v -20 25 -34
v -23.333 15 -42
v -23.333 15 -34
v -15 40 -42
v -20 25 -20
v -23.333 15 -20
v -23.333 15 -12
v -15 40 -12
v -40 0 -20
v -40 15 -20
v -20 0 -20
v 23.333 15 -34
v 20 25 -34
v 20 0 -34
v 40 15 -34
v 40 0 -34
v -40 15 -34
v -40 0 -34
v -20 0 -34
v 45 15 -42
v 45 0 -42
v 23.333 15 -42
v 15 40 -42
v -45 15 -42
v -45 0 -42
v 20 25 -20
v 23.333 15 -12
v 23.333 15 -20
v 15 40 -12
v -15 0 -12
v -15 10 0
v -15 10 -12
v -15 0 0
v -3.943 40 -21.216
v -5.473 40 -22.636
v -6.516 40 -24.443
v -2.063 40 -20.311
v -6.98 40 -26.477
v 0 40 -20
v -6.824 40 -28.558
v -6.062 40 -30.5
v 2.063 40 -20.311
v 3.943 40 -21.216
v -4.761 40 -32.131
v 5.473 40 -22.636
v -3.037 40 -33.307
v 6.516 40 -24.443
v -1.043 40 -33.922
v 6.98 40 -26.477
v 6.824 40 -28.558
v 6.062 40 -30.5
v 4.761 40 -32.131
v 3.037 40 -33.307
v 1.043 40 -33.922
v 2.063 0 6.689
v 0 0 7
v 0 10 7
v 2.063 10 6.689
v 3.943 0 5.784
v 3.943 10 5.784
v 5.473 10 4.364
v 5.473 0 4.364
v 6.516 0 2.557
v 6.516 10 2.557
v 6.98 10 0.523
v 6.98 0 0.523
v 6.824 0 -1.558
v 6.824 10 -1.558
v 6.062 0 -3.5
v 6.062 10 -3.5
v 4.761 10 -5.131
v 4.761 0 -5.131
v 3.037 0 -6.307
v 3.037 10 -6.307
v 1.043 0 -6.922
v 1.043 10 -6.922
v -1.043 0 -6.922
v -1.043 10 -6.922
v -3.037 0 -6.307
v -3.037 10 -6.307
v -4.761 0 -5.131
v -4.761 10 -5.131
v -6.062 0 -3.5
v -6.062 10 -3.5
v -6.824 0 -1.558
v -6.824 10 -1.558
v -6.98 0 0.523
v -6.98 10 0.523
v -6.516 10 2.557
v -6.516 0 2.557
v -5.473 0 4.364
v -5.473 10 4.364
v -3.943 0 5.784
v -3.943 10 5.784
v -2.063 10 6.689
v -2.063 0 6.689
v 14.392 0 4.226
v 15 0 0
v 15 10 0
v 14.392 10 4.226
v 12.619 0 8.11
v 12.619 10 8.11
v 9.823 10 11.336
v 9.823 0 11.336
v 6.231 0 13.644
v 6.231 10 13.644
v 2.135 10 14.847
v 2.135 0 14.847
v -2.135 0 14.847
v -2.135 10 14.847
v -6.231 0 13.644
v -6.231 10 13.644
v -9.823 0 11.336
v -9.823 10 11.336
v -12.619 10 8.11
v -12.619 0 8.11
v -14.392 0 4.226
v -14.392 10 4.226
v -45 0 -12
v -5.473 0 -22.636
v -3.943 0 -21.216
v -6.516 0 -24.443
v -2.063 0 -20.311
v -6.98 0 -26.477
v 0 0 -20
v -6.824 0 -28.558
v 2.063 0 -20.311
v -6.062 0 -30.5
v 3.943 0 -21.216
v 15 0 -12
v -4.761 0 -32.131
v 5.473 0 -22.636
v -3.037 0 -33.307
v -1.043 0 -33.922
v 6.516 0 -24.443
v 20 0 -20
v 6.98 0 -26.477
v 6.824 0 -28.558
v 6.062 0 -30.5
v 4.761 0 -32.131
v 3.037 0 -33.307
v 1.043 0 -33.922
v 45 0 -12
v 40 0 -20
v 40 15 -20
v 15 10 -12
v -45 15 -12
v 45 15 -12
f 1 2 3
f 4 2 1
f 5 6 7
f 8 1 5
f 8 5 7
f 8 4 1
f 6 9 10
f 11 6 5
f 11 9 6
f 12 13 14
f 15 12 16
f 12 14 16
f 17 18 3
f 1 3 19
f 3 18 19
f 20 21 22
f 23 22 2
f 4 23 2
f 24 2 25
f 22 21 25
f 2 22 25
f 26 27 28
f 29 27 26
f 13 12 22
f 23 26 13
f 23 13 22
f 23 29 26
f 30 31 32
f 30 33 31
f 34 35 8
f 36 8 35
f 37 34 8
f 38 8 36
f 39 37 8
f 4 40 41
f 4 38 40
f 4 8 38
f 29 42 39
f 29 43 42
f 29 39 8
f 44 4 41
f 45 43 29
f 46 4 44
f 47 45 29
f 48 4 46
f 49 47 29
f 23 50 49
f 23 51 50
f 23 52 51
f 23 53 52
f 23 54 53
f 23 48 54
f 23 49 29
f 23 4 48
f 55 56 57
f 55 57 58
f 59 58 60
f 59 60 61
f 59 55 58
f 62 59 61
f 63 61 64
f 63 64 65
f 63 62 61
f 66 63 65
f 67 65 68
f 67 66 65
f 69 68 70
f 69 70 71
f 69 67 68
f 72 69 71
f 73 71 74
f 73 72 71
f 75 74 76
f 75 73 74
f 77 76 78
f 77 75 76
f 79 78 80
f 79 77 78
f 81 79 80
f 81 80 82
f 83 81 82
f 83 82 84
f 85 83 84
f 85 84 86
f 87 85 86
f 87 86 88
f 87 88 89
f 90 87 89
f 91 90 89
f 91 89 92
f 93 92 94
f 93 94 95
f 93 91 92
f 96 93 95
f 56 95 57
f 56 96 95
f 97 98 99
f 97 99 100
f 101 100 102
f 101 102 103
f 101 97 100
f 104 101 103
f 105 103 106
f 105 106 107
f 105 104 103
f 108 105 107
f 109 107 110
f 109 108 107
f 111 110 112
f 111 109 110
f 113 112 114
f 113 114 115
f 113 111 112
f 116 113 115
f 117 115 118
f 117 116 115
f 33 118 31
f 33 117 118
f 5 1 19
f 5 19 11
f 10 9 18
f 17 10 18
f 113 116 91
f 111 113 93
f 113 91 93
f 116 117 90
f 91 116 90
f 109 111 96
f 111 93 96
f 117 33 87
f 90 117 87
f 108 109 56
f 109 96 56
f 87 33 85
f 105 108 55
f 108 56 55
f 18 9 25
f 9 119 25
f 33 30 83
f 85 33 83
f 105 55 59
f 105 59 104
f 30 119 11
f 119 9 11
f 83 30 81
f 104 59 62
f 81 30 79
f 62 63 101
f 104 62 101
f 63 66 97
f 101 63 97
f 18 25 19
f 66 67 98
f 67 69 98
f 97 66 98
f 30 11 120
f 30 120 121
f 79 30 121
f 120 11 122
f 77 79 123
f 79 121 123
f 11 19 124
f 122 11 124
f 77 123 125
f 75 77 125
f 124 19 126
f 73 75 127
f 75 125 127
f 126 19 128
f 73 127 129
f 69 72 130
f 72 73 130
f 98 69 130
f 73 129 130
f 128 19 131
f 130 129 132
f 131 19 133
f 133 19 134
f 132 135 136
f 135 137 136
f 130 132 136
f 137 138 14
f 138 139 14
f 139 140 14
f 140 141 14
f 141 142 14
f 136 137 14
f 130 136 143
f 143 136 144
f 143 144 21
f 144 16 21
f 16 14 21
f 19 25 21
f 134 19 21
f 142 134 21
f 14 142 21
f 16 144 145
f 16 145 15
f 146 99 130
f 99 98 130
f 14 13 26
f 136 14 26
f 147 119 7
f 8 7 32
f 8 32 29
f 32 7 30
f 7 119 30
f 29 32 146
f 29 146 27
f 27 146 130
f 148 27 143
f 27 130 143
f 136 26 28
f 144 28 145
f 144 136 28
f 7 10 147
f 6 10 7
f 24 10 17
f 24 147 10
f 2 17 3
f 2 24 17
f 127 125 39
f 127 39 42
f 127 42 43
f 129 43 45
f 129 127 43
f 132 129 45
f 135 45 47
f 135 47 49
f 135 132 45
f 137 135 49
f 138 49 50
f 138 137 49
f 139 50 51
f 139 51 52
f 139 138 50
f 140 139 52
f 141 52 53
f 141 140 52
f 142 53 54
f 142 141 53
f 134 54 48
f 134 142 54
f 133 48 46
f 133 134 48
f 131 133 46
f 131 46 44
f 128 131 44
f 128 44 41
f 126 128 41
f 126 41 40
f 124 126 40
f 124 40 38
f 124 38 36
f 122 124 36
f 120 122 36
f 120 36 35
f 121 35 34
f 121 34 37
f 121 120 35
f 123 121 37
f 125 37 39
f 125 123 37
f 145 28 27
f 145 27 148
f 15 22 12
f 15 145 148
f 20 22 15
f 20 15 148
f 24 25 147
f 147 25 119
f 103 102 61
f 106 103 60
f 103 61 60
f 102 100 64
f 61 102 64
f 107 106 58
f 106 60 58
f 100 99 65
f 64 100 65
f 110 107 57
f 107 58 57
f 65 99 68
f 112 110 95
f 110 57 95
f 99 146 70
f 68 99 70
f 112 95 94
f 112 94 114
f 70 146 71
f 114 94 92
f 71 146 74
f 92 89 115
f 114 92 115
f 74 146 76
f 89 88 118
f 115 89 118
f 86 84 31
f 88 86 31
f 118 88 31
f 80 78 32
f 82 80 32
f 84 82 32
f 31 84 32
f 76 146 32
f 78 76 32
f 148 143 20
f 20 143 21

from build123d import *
from OCP.BRepFilletAPI import BRepFilletAPI_MakeChamfer

# Parameters (mm, degrees)
SKETCH1_R           = 7
BOSS_EXTRUDE1_DEPTH = 10
SKETCH1_5_W         = 30
SKETCH1_5_H         = 30
SKETCH1_5_R         = 7
BOSS_EXTRUDE2_DEPTH = 40
BOSS_EXTRUDE5_DEPTH = 15
BOSS_EXTRUDE6_DEPTH = 15
SKETCH1_13_W        = 10
SKETCH1_13_H        = 30
BOSS_EXTRUDE7_DEPTH = 40
CHAMFER2_SIZE       = 30
CHAMFER2_SIZE2      = 10
SKETCH4_W           = 5
SKETCH4_H           = 14
CUT_EXTRUDE3_DEPTH  = 74.409808609


with BuildPart() as part:
    # Sketch1 → Boss-Extrude1 (new body)
    with BuildSketch(Plane(origin=(0, 0, 0), x_dir=(1, 0, 0), z_dir=(0, 1, 0))):
        with BuildLine():
            ThreePointArc((-15, 0), (0, -15), (15, 0))
            Line((15, 0), (15, 12))
            Line((15, 12), (-15, 12))
            Line((-15, 12), (-15, 0))
        make_face()
        Circle(SKETCH1_R, mode=Mode.SUBTRACT)
    extrude(amount=BOSS_EXTRUDE1_DEPTH)

    # Sketch1<5> → Boss-Extrude2 (add)
    with BuildSketch(Plane(origin=(0, 0, 0), x_dir=(1, 0, 0), z_dir=(0, 1, 0))):
        with Locations((0, 27)):
            Rectangle(SKETCH1_5_W, SKETCH1_5_H)
        with Locations((0, 27)):
            Circle(SKETCH1_5_R, mode=Mode.SUBTRACT)
    extrude(amount=BOSS_EXTRUDE2_DEPTH)



with BuildPart() as body_2:
    # Sketch1<11> → Boss-Extrude5 (new body)
    with BuildSketch(Plane(origin=(0, 0, 0), x_dir=(1, 0, 0), z_dir=(0, 1, 0))):
        Polygon((25, 20), (25, 12), (45, 12), (45, 42), (25, 42), (25, 34), (40, 34), (40, 20), align=None)
    extrude(amount=BOSS_EXTRUDE5_DEPTH)


with BuildPart() as body_3:
    # Sketch1<12> → Boss-Extrude6 (new body)
    with BuildSketch(Plane(origin=(0, 0, 0), x_dir=(1, 0, 0), z_dir=(0, 1, 0))):
        Polygon((-45, 12), (-25, 12), (-25, 20), (-40, 20), (-40, 34), (-25, 34), (-25, 42), (-45, 42), align=None)
    extrude(amount=BOSS_EXTRUDE6_DEPTH)


with BuildPart() as part_1:
    add(part.part)

    add(body_2.part)  # Boss-Extrude7 merges body 2

    add(body_3.part)  # Boss-Extrude7 merges body 3
    # Sketch1<13> → Boss-Extrude7 (add)
    with BuildSketch(Plane(origin=(0, 0, 0), x_dir=(1, 0, 0), z_dir=(0, 1, 0))):
        with Locations((20, 27)):
            Rectangle(SKETCH1_13_W, SKETCH1_13_H)
        with Locations((-20, 27)):
            Rectangle(SKETCH1_13_W, SKETCH1_13_H)
    extrude(amount=BOSS_EXTRUDE7_DEPTH)

    # Chamfer2: one chamfer whose edges measure the first distance from different faces: ONE call of the kernel's chamfer builder (chamfer() names one face for all edges)
    chamfer2_edges_1 = [part_1.edges().sort_by_distance(p)[0] for p in [
        (25, 40, -27),
    ]]
    chamfer2_side_1 = [part_1.faces().sort_by_distance(p)[0] for p in [
        (25, 23.125, -27),
    ]]
    chamfer2_edges_2 = [part_1.edges().sort_by_distance(p)[0] for p in [
        (-25, 40, -27),
    ]]
    chamfer2_side_2 = [part_1.faces().sort_by_distance(p)[0] for p in [
        (-25, 23.125, -27),
    ]]
    chamfer2 = BRepFilletAPI_MakeChamfer(part_1.part.solid().wrapped)
    for e in chamfer2_edges_1:
        chamfer2.Add(CHAMFER2_SIZE, CHAMFER2_SIZE2, e.wrapped, chamfer2_side_1[0].wrapped)  # the first distance lies on this face
    for e in chamfer2_edges_2:
        chamfer2.Add(CHAMFER2_SIZE, CHAMFER2_SIZE2, e.wrapped, chamfer2_side_2[0].wrapped)  # the first distance lies on this face
    add(Compound.cast(chamfer2.Shape()), mode=Mode.REPLACE)

    # Sketch4 → Cut-Extrude3 (cut, through all)
    with BuildSketch(Plane.XZ):
        with Locations((-22.5, -27)):
            Rectangle(SKETCH4_W, SKETCH4_H)
        with Locations((22.5, -27)):
            Rectangle(SKETCH4_W, SKETCH4_H)
    extrude(amount=-CUT_EXTRUDE3_DEPTH, mode=Mode.SUBTRACT)


solid = part_1.part
